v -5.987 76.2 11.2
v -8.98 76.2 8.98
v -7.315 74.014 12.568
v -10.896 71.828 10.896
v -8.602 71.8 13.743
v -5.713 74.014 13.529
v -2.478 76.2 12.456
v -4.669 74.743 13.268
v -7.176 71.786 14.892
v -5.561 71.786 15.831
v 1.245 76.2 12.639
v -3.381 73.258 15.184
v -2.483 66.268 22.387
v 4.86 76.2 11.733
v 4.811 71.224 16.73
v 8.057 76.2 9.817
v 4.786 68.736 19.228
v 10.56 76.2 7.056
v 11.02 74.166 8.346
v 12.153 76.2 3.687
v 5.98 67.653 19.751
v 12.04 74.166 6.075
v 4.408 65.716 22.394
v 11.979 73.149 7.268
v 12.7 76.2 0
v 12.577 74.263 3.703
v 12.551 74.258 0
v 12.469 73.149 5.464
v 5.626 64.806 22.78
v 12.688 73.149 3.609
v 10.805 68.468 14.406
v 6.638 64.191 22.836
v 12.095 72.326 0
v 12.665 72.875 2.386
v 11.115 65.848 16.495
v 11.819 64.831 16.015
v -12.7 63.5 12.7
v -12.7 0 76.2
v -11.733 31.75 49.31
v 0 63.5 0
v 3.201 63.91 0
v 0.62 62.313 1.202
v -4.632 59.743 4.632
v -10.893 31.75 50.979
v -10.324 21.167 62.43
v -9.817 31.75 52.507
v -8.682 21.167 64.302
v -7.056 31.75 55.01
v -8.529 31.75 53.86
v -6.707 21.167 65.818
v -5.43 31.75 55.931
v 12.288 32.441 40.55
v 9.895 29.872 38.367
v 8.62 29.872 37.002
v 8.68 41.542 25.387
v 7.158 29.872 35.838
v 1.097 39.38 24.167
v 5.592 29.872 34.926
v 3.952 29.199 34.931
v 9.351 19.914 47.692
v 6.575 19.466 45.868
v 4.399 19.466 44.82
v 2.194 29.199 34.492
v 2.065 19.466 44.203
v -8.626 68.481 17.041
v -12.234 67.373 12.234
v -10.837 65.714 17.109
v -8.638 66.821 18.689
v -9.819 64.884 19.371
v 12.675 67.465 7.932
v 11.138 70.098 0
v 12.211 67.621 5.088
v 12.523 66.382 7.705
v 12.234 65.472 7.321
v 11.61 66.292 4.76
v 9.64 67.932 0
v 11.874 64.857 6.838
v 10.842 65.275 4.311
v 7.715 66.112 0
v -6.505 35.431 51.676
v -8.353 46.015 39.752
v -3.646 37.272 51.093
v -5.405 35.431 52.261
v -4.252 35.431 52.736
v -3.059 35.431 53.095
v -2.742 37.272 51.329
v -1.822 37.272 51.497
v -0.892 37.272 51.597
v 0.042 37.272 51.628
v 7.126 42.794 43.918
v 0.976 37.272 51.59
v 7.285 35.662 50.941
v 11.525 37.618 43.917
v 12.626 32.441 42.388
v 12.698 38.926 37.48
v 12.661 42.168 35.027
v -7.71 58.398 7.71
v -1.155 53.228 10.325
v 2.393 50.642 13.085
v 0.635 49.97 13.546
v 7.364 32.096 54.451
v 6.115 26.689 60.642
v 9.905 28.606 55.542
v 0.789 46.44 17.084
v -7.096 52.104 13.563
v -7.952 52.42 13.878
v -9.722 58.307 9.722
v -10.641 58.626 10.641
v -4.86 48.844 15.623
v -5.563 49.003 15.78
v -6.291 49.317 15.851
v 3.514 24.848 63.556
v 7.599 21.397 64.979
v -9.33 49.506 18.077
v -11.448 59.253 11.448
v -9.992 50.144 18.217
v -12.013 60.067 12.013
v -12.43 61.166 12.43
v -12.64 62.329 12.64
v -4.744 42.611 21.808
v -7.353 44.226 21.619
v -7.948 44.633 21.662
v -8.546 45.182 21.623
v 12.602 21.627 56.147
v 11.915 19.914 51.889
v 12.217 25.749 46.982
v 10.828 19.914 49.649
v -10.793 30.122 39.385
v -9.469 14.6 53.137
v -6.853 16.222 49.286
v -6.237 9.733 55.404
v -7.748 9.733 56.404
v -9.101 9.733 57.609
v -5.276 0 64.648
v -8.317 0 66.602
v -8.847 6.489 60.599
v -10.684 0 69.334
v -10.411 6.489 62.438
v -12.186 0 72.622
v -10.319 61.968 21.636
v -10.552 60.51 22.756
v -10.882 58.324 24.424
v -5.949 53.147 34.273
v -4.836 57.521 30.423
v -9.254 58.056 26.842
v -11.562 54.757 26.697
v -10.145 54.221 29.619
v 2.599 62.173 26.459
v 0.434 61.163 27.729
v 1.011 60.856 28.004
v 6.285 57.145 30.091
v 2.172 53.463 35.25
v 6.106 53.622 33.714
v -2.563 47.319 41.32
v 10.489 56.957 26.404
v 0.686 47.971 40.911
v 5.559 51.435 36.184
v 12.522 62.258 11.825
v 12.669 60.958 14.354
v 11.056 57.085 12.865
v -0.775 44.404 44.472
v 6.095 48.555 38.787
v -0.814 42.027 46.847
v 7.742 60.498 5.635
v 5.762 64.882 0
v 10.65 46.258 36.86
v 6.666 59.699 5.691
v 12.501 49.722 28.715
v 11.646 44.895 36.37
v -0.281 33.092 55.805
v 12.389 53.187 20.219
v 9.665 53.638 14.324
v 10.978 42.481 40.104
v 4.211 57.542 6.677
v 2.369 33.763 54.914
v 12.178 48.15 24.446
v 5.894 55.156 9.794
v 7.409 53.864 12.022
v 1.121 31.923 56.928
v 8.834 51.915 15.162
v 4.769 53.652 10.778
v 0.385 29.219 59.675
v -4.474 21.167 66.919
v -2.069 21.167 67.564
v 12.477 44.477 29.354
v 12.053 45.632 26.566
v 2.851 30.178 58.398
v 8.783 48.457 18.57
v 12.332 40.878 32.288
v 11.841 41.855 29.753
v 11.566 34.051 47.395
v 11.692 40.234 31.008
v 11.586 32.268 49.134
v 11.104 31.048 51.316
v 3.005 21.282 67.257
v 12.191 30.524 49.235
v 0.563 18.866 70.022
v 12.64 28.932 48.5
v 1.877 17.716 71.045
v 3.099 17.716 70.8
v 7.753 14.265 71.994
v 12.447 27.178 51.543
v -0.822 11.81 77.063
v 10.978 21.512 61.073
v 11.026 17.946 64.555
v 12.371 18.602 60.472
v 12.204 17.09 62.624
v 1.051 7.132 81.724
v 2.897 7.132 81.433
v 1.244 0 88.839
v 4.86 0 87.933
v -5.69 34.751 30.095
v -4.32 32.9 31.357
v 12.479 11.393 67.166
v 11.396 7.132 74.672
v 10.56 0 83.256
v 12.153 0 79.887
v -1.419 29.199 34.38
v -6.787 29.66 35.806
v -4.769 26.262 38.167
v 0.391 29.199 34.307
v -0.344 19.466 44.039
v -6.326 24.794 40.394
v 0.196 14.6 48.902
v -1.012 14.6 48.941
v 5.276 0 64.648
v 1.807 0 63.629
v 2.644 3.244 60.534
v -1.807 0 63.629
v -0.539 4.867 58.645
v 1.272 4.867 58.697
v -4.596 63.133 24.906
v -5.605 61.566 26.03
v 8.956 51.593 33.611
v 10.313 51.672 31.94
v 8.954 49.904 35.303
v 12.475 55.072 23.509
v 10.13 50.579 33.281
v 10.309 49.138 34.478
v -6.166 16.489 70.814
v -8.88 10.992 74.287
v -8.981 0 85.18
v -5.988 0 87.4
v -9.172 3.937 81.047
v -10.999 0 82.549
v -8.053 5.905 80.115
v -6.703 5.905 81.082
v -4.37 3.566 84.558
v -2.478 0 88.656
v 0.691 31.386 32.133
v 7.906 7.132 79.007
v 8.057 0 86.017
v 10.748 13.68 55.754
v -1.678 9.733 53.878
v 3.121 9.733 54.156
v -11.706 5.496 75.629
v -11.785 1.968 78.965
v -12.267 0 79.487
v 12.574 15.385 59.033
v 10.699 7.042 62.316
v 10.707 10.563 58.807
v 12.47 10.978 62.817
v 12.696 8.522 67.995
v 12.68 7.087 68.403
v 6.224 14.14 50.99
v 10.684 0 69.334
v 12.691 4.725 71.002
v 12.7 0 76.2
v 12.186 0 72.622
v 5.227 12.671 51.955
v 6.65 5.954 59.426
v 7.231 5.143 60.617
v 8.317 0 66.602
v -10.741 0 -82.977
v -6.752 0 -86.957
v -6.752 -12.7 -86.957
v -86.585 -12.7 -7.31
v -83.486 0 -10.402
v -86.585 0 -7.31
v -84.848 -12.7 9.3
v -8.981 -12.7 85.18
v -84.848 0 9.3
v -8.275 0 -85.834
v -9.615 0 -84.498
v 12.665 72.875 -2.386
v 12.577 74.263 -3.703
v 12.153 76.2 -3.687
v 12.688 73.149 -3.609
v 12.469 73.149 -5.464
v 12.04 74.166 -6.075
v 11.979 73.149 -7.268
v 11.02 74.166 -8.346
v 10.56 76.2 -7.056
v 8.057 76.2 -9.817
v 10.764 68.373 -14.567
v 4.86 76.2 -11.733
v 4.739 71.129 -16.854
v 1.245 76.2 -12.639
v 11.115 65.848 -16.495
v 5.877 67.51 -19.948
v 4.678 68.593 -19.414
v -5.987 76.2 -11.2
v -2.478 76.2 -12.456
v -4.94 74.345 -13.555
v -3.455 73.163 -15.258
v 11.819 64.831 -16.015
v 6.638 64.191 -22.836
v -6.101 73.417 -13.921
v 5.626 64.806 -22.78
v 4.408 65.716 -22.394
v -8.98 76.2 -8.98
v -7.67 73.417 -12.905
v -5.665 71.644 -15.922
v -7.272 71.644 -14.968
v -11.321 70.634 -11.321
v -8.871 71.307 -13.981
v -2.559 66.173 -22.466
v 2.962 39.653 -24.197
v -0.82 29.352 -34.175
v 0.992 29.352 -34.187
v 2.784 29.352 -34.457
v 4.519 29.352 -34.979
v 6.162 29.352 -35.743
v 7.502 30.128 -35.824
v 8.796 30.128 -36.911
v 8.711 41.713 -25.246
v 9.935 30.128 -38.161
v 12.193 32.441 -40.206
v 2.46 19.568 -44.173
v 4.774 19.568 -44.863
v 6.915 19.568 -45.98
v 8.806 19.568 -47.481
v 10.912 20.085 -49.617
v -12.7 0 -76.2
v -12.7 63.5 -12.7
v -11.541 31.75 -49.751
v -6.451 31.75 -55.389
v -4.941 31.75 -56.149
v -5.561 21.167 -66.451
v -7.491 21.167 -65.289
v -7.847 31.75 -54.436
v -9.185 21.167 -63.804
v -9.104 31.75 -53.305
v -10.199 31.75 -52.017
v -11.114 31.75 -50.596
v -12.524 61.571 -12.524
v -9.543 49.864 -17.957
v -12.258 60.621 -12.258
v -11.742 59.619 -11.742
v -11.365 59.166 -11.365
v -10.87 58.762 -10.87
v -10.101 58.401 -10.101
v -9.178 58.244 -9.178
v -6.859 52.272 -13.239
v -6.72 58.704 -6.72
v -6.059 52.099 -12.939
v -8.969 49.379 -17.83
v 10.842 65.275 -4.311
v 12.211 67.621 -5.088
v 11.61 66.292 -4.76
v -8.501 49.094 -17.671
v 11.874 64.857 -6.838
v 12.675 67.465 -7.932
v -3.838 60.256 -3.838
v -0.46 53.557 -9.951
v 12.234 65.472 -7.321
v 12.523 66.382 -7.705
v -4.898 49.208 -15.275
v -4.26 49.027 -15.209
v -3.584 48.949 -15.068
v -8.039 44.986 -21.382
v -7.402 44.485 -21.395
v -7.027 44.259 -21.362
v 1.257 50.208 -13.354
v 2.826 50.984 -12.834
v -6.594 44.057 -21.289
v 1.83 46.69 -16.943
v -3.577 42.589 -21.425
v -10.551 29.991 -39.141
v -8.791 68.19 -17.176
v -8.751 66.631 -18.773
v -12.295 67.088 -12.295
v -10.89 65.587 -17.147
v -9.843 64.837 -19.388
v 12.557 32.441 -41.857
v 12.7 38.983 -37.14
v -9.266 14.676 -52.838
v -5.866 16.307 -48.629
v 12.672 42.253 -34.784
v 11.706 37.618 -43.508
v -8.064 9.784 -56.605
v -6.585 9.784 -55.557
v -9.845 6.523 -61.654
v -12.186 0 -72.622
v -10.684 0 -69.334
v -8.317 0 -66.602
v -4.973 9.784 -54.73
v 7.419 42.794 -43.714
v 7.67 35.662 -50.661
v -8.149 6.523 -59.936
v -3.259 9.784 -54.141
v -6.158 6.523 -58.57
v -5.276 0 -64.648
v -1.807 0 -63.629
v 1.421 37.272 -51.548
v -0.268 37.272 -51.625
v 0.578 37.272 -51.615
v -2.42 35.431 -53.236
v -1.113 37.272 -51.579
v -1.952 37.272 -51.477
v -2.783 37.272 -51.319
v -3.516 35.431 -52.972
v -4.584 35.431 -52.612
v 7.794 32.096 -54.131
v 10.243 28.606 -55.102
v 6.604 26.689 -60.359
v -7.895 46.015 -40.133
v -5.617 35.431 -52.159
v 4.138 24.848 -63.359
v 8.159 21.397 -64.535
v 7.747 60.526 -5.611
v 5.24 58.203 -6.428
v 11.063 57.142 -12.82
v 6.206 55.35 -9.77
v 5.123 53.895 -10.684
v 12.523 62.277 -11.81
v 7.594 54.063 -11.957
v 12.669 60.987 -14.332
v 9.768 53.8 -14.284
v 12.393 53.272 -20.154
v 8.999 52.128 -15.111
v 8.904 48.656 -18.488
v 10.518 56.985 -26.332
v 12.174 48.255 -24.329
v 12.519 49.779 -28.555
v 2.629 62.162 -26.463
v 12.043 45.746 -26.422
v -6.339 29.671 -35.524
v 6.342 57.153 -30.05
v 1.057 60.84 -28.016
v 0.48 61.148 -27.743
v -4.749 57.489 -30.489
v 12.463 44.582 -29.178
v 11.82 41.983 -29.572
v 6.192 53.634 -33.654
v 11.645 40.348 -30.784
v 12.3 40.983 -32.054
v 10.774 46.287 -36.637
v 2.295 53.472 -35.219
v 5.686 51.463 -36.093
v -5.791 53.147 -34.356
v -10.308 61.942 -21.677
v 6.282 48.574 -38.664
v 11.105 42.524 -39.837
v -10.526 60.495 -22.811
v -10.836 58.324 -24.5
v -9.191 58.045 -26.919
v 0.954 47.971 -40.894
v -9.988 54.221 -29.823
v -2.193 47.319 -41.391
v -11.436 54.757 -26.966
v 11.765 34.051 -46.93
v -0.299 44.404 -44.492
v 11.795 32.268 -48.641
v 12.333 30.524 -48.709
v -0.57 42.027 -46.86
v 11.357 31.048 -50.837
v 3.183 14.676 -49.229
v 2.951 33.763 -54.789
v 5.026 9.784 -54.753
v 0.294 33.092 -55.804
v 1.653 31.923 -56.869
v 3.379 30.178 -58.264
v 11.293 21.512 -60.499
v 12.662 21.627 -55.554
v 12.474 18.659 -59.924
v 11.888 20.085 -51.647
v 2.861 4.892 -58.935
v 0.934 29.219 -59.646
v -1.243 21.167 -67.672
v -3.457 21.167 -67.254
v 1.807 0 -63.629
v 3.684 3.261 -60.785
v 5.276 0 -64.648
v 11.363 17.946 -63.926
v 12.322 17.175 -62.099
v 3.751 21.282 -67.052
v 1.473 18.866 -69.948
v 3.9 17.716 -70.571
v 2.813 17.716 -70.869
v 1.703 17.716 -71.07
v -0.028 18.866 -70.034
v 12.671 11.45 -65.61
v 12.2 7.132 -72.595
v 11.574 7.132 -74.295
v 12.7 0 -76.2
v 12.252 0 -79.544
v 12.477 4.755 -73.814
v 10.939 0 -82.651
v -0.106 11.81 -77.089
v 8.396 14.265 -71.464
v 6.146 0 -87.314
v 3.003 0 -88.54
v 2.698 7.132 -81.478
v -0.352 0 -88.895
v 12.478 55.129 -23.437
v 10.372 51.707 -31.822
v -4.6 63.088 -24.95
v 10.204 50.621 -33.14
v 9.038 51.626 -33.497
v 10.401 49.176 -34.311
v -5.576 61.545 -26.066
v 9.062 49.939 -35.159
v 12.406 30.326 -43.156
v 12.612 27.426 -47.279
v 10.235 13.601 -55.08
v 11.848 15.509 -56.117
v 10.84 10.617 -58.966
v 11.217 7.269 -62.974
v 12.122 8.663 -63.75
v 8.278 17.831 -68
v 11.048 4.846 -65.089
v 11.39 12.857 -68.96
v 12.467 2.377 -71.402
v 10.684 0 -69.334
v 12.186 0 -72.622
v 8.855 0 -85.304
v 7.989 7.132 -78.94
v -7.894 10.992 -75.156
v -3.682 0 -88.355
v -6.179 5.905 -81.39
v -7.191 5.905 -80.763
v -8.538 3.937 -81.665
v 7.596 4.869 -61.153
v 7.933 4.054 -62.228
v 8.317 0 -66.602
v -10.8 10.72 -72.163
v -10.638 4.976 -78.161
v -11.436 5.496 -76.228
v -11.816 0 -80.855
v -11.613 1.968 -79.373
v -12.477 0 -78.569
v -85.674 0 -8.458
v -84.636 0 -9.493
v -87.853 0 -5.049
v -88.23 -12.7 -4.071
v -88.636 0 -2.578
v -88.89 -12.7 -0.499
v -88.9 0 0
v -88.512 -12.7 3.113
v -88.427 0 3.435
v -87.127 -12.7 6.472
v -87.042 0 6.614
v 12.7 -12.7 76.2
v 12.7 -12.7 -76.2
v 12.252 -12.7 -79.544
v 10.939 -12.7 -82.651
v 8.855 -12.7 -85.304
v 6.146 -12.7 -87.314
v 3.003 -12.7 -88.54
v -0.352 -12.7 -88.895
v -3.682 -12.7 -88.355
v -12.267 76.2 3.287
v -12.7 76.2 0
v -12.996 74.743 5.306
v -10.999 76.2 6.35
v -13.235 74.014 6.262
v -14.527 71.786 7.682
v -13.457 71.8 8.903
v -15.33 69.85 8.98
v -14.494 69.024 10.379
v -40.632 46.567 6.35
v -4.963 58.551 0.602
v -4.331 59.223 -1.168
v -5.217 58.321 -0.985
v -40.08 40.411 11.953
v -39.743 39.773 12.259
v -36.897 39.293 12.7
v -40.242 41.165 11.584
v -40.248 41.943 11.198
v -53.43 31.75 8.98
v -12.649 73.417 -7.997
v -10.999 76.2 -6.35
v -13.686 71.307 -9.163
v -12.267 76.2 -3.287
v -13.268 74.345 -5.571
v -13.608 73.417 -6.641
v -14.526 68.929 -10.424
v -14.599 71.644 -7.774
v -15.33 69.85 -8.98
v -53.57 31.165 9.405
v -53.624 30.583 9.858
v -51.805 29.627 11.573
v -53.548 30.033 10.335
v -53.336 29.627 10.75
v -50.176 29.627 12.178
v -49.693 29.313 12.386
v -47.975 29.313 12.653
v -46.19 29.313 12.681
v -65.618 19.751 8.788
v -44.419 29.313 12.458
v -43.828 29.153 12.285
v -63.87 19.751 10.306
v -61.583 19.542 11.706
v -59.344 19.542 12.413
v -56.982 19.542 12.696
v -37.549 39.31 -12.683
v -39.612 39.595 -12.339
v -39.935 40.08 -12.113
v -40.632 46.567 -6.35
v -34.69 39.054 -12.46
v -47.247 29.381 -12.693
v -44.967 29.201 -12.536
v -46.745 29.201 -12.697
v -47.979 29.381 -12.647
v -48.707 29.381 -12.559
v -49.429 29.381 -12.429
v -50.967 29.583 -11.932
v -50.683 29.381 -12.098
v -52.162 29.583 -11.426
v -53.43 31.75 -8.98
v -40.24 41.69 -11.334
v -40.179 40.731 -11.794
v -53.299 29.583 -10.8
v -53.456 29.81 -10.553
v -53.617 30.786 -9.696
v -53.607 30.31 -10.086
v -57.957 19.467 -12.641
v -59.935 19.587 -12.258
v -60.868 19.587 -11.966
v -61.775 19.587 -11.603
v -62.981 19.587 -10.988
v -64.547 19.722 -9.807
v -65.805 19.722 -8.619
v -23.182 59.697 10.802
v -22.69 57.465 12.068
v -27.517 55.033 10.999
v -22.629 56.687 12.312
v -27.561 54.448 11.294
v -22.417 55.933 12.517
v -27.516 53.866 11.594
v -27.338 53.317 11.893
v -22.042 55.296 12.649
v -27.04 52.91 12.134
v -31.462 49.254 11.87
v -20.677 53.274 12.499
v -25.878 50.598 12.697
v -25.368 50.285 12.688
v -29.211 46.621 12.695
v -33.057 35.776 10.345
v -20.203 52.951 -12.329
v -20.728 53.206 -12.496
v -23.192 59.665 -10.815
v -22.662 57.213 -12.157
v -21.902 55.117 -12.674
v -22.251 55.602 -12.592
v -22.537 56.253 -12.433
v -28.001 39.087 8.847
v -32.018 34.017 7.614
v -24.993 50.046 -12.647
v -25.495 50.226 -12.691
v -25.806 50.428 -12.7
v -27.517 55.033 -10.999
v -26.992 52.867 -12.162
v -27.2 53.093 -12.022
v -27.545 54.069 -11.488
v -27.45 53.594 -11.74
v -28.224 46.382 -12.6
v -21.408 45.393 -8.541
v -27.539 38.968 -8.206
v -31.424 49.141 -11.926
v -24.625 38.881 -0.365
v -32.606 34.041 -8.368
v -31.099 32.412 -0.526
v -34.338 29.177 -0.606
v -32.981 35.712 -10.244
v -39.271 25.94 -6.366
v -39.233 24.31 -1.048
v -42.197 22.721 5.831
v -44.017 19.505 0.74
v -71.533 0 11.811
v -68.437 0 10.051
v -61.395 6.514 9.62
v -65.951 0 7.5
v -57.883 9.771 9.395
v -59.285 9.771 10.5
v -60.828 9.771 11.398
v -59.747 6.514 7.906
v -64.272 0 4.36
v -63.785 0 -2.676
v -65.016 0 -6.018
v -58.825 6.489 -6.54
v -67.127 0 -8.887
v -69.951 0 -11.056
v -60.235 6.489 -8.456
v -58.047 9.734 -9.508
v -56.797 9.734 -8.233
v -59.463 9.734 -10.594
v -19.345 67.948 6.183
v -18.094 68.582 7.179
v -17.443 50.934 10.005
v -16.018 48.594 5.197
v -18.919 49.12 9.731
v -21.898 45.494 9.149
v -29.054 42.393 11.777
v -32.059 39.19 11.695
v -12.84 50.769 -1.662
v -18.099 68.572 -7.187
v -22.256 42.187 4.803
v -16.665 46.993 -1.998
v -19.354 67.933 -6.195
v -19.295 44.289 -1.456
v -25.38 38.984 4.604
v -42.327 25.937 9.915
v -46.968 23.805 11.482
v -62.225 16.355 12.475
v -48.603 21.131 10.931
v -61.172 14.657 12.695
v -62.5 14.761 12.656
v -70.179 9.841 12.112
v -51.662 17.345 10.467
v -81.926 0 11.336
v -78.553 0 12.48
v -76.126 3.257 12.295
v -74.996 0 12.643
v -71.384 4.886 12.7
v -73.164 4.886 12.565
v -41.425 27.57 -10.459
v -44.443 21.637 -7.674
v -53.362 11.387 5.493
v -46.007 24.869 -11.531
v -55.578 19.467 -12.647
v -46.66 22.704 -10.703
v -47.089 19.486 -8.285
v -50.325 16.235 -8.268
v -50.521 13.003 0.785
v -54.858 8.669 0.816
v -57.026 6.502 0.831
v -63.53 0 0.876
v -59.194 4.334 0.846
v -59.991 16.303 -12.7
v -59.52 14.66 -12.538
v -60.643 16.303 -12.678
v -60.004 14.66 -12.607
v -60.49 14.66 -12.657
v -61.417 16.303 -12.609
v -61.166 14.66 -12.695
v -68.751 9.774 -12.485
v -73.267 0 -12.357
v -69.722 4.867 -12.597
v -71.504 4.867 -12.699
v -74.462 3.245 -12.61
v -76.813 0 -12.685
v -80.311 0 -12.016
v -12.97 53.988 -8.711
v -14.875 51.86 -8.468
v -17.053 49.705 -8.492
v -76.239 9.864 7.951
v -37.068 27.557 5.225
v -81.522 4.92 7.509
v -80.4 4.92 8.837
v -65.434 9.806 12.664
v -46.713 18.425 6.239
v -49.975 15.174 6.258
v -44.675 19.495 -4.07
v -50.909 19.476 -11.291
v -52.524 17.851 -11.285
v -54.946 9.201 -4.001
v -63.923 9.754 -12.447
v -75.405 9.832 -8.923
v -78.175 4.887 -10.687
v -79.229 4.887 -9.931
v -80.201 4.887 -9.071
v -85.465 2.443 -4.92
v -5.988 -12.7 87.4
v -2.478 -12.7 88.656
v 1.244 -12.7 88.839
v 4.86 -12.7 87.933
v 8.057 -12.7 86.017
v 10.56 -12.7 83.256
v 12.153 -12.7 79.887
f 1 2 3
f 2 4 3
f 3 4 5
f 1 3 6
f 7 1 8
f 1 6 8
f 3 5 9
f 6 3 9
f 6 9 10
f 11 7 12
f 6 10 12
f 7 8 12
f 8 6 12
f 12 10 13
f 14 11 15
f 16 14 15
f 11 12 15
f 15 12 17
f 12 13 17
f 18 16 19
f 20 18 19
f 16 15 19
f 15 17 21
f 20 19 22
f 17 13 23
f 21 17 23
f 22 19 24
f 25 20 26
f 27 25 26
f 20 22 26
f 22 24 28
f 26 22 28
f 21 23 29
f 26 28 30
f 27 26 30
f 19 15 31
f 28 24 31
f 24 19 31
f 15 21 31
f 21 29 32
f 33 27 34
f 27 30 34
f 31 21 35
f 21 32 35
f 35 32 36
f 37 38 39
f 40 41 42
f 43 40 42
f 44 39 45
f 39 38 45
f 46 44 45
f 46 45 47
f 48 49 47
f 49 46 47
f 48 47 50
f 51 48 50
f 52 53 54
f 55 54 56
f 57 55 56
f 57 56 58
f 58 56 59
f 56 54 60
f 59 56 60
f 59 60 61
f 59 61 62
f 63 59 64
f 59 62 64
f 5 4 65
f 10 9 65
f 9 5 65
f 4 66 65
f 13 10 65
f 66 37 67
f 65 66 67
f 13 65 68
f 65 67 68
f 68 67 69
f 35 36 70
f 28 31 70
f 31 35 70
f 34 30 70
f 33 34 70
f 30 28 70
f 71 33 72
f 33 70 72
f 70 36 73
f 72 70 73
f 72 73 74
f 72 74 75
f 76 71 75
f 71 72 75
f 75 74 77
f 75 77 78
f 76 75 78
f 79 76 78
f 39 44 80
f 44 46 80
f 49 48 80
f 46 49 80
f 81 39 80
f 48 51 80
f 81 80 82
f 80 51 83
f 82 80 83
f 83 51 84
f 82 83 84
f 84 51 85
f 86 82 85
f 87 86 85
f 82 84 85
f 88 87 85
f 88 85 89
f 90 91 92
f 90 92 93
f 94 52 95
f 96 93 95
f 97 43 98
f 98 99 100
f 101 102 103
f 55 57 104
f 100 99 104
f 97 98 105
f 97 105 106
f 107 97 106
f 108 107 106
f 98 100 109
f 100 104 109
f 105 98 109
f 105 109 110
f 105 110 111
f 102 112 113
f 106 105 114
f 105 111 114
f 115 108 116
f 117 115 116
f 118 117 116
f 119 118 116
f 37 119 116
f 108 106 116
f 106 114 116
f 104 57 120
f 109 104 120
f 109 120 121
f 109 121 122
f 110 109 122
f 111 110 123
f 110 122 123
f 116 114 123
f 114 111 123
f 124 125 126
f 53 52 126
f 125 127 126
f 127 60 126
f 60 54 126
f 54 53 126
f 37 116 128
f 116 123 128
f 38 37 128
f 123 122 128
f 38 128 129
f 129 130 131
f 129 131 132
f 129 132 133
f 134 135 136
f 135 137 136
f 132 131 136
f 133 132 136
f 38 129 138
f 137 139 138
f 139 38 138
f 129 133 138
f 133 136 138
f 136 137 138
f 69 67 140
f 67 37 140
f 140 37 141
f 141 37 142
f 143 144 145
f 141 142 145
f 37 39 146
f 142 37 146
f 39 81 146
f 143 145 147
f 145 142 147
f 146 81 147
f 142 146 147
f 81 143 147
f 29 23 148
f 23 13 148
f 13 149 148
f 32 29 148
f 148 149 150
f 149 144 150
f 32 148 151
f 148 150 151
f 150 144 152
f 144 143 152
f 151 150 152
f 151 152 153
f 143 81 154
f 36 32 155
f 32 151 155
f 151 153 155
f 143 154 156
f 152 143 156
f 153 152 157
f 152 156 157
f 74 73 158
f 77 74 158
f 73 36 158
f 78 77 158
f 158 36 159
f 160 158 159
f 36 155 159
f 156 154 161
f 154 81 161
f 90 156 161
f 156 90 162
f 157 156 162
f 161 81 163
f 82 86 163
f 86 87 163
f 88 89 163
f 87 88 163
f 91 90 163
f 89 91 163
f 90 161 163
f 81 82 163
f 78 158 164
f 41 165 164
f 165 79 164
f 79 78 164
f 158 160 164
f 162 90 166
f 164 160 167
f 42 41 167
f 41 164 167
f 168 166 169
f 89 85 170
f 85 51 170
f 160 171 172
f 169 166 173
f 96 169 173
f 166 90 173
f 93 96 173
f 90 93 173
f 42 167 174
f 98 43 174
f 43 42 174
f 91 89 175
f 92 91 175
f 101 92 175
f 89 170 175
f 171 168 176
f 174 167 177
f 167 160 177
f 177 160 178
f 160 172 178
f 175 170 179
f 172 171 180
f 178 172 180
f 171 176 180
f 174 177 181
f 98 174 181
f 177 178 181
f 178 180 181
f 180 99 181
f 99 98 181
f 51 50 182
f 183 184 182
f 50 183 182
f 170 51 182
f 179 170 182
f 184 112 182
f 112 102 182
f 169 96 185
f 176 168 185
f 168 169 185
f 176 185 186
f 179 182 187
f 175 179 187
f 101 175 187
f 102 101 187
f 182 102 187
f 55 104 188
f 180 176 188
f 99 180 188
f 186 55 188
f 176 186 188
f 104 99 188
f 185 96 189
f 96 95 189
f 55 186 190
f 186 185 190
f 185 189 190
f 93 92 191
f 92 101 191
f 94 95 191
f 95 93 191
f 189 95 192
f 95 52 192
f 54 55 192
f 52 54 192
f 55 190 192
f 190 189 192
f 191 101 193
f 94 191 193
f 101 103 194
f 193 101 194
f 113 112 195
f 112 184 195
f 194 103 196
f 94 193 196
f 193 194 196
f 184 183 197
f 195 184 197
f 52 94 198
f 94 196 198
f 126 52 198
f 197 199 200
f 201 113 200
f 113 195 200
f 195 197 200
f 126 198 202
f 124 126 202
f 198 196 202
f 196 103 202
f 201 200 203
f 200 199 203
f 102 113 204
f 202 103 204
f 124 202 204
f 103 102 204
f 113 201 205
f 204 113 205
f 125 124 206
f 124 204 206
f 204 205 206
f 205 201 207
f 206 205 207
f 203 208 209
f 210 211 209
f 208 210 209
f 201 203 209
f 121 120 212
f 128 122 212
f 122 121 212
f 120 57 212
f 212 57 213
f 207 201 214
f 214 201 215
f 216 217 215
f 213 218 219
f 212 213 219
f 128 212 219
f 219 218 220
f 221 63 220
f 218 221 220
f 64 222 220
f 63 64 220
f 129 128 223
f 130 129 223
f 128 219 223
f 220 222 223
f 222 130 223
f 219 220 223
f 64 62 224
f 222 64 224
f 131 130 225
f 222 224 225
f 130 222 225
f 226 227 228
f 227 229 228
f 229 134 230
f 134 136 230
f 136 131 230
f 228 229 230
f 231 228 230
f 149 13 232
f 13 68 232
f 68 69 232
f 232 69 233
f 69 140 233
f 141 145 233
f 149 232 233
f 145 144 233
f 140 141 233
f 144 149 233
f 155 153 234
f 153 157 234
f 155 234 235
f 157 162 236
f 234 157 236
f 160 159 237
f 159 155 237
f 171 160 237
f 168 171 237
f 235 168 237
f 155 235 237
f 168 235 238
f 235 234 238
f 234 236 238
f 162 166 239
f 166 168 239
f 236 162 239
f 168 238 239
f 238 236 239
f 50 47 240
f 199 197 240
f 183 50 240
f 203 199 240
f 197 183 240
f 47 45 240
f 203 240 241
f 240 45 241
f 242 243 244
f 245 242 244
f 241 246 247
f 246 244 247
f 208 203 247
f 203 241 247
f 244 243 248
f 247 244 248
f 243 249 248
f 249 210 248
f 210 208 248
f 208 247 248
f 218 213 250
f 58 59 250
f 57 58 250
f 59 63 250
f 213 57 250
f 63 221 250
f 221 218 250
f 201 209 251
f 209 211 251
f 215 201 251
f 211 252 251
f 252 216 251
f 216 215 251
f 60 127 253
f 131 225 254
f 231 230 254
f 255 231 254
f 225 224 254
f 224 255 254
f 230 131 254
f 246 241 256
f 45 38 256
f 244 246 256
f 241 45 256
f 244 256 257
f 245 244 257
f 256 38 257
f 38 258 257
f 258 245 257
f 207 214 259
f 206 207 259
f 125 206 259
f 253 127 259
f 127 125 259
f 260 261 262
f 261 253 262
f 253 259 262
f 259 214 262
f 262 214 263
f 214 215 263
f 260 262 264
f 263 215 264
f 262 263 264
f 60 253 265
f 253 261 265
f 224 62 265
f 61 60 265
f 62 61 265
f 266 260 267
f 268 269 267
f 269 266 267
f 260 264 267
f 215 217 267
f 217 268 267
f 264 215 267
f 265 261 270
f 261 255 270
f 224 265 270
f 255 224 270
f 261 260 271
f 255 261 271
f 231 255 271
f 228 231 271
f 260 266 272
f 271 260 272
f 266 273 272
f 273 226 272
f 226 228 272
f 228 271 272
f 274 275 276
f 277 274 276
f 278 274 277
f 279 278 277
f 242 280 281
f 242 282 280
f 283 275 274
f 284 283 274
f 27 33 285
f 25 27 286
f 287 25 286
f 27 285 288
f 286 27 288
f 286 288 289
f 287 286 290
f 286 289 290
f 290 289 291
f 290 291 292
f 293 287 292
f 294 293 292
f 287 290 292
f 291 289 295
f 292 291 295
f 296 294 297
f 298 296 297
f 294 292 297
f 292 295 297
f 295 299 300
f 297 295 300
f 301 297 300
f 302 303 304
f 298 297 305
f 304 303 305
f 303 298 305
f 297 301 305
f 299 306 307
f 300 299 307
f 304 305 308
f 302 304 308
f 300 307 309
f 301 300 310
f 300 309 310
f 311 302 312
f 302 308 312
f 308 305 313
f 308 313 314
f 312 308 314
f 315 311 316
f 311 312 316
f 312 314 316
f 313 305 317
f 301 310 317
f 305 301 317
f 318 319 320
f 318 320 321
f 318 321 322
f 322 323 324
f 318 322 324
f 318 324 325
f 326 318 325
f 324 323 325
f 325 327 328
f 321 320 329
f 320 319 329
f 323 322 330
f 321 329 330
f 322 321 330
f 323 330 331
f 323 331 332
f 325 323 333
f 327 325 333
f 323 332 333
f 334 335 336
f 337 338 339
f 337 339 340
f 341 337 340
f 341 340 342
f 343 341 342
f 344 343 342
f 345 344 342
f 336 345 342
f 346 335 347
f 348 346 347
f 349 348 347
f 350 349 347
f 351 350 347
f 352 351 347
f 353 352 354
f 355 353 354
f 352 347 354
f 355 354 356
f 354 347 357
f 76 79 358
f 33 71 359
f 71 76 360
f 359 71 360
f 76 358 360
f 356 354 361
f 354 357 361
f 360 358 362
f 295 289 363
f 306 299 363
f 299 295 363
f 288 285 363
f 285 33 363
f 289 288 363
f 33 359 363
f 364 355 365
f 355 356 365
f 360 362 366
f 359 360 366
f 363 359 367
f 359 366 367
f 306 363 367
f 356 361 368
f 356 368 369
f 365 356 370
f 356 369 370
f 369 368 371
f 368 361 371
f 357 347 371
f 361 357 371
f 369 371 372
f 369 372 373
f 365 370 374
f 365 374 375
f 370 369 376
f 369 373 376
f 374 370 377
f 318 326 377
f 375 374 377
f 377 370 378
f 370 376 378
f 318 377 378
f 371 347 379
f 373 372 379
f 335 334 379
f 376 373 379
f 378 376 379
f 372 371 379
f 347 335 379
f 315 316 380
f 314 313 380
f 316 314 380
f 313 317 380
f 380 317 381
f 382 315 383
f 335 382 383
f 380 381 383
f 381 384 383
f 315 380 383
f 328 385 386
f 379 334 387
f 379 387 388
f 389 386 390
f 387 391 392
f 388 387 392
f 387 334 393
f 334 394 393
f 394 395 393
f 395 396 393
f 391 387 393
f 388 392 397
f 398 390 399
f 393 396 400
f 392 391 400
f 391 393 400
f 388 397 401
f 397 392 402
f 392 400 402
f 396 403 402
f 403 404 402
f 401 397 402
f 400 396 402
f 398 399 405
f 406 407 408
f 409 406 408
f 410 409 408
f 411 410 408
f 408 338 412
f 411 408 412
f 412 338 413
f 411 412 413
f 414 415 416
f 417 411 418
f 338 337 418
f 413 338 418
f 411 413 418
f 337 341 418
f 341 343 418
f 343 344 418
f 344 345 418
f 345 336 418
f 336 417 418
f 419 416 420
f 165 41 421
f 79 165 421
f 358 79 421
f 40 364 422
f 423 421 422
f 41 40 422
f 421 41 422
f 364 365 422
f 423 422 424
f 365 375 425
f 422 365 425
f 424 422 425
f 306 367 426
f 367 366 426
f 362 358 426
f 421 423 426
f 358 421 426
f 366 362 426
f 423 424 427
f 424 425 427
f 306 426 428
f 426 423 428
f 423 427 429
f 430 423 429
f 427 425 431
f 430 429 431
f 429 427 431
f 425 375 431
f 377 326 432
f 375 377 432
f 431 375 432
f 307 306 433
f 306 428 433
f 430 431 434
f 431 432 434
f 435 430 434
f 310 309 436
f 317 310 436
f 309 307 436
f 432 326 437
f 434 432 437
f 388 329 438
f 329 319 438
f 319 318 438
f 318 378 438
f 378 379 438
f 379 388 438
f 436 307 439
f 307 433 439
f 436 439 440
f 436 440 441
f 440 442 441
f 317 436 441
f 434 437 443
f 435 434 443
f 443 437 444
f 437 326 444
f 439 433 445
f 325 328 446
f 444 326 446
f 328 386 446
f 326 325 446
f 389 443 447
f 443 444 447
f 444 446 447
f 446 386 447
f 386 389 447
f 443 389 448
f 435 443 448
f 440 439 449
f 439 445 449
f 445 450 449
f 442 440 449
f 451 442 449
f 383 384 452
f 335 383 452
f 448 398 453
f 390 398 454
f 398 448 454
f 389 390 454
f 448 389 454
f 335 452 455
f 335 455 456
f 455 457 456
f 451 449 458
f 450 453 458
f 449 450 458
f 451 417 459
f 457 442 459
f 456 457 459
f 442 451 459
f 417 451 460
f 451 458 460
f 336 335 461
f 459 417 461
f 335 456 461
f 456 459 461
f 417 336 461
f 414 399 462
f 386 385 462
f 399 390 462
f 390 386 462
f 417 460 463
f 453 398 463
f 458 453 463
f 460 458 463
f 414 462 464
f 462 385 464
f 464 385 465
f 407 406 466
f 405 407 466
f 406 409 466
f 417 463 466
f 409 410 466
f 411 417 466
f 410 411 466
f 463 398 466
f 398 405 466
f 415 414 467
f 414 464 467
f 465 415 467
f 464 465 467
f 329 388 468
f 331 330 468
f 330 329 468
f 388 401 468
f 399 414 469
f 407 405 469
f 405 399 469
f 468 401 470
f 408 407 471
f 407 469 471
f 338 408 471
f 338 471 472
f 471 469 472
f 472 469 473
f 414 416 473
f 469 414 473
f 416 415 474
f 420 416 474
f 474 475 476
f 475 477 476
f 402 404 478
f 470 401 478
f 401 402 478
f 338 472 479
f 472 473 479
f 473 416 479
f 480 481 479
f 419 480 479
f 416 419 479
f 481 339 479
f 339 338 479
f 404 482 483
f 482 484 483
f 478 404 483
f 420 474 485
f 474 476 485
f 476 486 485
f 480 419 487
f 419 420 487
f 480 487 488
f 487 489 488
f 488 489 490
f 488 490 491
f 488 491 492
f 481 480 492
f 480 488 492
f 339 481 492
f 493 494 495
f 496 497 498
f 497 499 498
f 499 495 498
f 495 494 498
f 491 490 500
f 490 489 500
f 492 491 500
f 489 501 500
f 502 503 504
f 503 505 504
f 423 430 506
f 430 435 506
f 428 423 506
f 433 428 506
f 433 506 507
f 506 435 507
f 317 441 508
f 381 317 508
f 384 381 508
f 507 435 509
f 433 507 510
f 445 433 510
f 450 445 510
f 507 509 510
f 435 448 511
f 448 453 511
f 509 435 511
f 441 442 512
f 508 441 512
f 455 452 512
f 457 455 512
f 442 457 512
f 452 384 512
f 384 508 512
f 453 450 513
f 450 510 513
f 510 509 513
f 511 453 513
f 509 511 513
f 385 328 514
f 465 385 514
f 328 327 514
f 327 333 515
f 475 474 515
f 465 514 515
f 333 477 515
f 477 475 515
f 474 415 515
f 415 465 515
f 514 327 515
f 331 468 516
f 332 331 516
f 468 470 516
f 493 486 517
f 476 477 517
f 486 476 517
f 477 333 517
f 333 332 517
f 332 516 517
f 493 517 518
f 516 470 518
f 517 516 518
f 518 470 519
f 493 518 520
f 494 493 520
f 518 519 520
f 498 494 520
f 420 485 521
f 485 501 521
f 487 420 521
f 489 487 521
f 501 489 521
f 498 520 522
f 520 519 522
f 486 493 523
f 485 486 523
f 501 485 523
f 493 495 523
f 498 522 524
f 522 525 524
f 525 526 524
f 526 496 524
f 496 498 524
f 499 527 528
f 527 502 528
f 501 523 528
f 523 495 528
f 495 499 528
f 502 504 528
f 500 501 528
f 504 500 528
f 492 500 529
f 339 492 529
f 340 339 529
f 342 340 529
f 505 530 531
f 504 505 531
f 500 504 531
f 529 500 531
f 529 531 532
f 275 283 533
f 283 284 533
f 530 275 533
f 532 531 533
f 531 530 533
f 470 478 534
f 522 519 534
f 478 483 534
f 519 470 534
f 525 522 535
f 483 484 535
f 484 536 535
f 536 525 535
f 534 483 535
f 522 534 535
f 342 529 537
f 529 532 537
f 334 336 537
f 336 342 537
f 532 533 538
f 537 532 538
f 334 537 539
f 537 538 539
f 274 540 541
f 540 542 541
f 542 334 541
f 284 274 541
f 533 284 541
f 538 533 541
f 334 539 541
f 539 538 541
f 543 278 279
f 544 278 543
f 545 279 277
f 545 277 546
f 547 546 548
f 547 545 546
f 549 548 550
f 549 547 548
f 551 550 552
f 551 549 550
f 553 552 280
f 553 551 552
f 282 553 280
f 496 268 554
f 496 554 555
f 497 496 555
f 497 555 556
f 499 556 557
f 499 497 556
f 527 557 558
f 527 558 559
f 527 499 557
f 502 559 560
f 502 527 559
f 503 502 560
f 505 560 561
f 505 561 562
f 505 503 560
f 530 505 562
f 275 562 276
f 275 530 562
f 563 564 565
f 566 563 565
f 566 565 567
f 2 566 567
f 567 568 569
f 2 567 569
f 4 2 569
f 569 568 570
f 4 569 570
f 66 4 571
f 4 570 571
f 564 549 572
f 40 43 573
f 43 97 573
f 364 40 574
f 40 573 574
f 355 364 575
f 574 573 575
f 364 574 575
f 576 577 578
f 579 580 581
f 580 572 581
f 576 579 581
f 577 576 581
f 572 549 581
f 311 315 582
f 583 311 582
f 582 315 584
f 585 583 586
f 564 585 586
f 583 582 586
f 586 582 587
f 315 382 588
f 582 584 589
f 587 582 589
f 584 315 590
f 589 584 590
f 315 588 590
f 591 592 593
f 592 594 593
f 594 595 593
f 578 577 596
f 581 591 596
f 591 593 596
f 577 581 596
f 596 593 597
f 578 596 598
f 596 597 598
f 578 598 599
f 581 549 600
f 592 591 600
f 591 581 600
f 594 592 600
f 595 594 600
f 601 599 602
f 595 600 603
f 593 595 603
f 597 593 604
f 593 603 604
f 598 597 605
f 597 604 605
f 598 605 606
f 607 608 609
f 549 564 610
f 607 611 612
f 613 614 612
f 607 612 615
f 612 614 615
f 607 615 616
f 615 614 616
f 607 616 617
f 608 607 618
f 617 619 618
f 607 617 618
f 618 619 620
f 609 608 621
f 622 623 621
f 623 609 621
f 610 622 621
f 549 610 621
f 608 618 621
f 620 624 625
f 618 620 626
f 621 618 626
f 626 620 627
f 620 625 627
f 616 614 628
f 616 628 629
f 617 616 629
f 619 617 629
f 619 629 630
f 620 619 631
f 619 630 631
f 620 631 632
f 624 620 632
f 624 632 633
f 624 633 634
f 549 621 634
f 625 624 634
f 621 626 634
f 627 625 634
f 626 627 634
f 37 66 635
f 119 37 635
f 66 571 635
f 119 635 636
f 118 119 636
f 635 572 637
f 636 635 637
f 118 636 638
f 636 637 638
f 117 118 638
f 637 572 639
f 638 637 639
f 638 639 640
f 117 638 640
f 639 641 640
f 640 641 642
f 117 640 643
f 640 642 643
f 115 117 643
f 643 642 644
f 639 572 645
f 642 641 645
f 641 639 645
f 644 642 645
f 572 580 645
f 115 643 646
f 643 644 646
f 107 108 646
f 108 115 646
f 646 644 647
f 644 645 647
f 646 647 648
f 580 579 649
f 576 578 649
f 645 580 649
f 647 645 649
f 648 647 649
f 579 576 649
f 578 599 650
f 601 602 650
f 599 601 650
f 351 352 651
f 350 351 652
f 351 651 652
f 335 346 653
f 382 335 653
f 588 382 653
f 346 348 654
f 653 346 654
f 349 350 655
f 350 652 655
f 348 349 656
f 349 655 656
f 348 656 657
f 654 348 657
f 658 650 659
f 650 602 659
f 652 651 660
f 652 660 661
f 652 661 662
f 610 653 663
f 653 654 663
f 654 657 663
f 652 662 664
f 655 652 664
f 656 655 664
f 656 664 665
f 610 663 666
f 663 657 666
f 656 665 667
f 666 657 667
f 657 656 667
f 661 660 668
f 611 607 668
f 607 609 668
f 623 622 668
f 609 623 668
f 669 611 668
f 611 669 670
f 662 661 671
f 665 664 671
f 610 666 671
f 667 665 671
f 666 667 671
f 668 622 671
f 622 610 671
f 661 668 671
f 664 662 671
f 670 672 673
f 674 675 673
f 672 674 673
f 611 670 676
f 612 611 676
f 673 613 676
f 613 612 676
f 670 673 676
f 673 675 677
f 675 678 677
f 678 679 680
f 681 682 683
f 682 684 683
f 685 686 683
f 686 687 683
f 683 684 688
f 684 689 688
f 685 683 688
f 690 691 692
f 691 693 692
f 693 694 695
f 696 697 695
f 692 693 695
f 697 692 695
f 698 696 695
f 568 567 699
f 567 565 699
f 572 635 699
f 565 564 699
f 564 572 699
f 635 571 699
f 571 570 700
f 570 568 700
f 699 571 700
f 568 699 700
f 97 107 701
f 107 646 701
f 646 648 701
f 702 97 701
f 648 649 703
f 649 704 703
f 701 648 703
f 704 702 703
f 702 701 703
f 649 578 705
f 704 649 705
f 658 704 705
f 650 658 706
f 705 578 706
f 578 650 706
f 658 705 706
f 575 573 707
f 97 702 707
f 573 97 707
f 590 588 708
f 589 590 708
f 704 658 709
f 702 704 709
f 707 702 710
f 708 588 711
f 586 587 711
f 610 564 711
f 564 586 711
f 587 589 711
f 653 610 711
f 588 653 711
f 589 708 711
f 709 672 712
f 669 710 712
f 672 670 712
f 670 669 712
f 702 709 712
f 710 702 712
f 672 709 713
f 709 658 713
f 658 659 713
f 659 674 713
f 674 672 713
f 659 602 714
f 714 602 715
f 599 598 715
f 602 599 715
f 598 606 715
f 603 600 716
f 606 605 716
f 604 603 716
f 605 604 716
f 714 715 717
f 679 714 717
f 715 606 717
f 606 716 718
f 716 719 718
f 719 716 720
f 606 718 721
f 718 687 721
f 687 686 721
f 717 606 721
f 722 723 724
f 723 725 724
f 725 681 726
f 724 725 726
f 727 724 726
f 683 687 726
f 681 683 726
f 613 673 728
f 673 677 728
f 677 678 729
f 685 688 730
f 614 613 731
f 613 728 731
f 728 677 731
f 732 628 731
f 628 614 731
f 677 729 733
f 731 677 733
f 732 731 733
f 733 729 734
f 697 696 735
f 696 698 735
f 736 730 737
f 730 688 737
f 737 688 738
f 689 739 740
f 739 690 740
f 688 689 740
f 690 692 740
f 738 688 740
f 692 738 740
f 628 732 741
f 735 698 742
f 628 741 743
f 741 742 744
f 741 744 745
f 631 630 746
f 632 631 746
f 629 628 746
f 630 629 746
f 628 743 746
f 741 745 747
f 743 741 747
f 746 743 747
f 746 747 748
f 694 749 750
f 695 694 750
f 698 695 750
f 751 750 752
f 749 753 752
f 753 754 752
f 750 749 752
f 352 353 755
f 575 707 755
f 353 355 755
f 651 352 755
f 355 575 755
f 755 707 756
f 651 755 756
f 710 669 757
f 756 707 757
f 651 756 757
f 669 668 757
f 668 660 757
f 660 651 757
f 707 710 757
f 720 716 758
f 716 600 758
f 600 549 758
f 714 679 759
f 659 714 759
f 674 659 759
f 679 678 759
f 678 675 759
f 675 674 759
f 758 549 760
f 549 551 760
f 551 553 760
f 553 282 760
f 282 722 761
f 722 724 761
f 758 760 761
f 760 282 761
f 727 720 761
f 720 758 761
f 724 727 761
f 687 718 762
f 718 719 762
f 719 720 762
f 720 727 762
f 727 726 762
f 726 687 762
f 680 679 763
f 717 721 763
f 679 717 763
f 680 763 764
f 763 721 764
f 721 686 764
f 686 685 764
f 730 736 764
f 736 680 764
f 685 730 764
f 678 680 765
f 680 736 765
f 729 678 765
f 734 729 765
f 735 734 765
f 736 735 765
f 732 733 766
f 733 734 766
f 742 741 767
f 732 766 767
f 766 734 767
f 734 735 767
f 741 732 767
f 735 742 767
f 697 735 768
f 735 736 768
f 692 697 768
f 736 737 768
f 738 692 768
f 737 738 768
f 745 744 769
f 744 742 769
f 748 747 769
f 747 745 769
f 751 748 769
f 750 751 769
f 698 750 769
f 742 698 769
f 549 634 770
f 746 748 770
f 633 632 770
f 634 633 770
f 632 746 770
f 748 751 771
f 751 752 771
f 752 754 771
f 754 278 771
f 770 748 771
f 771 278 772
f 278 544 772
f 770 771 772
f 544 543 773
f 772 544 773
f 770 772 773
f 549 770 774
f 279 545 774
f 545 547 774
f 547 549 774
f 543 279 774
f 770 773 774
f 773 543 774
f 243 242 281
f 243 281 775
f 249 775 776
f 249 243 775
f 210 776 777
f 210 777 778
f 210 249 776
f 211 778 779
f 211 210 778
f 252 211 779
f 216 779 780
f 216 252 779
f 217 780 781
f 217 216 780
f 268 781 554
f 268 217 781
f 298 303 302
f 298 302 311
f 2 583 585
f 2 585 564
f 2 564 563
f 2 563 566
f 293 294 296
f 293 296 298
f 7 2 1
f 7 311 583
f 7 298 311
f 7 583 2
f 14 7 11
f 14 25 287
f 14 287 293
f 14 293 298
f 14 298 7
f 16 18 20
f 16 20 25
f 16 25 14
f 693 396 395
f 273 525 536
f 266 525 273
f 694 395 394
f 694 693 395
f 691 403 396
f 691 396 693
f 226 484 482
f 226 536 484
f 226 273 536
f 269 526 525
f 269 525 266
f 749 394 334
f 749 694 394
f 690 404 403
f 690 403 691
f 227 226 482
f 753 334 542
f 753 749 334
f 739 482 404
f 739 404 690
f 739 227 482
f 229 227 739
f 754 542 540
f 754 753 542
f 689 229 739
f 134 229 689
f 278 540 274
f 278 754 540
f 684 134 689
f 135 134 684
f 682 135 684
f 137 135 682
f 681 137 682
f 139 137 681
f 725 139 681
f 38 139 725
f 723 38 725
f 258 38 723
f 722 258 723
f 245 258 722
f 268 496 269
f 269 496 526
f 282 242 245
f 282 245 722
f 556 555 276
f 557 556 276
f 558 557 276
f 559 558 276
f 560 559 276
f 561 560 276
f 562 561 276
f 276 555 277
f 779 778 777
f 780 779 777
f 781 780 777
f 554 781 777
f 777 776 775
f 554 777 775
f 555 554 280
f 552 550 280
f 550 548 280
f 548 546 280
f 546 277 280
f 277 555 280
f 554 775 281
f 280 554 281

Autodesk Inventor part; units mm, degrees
ref_plane "YZ Plane" through (0, 0, 0) normal (1, 0, 0) x (0, 1, 0)
ref_plane "XY Plane" through (0, 0, 0) normal (0, 0, 1) x (1, 0, 0)
sketch "Sketch2" plane through (0, 0, 0) normal (1, 0, 0) x (0, 1, 0)
  line L0 (0, 0) -> (76.2, 0) construction
  line L1 (0, 0) -> (0, -76.2) construction
  line L2 (0, 0) -> (0, 76.2) construction
  line L3 (76.2, 0) -> (0, 76.2)
  dimension "d0" = 76.2
  dimension "d1" = 76.2
  dimension "d2" = 76.2
sketch "Sketch3" plane through (0, 0, 0) normal (0, 0, 1) x (1, 0, 0)
  line L0 (0, 0) -> (0, 76.2) construction
  line L1 (0, 0) -> (-76.2, 0) construction
  line L2 (0, 76.2) -> (-76.2, 0)
  dimension "d3" = 76.2
  dimension "d4" = 76.2
ref_plane "Work Plane1" through (0, 76.2, 0) normal (0, 1, 0) x (-1, 0, 0)
sketch "Sketch4" plane through (0, 76.2, 0) normal (0, 1, 0) x (-1, 0, 0)
  circle A0 centre (0, 0) radius 12.7
  dimension "d6" = 25.4
sweep "Sweep1" add profiles "Sketch4" path "Sketch3"
sketch "Sketch5" plane through (0, 76.2, 0) normal (0, 1, 0) x (-1, 0, 0)
  circle A0 centre (0, 0) radius 12.7
sweep "Sweep3" add profiles "Sketch5" path "Sketch2"
sketch "Sketch6" plane through (0, 0, 0) normal (1, 0, 0) x (0, 1, 0)
  line L0 (76.2, 8.9803) -> (76.2, -12.7) projected
  line L1 (76.2, 0) -> (0, -76.2)
  point P0 (0, 0)
  point P1 (76.2, -8.9803)
  dimension "d13" = 76.2
sketch "Sketch7" plane through (0, 76.2, 0) normal (0, 1, 0) x (-1, 0, 0)
  circle A0 centre (0, 0) radius 12.7
sweep "Sweep4" add profiles "Sketch7" path "Sketch6" path curves L1
sketch "Sketch10" plane through (0, 0, 0) normal (0, 1, 0) x (-1, 0, 0)
  circle A0 centre (0, 76.2) radius 12.7 projected
  circle A1 centre (0, -76.2) radius 12.7 projected
  circle A2 centre (76.2, 0) radius 12.7 projected
  line L0 (-12.7, 76.2) -> (-12.7, -76.2)
  line L1 (6.7517, -86.9566) -> (86.5852, -7.3102)
  circle A3 centre (76.2, 0) radius 12.7 projected
  line L2 (84.8484, 9.3002) -> (8.981, 85.1796)
  point P0 (0, 0)
extrude "Extrusion1" add sketch "Sketch10" against normal blind 12.7 contours A0 | A0 L2 A2 L1 A1 L0 | A2 L1 | A1 L1 picked at (77.9931, 4.4447) picked at (3.5769, -74.7711)
properties part number "CameraTripodBaseV02"
